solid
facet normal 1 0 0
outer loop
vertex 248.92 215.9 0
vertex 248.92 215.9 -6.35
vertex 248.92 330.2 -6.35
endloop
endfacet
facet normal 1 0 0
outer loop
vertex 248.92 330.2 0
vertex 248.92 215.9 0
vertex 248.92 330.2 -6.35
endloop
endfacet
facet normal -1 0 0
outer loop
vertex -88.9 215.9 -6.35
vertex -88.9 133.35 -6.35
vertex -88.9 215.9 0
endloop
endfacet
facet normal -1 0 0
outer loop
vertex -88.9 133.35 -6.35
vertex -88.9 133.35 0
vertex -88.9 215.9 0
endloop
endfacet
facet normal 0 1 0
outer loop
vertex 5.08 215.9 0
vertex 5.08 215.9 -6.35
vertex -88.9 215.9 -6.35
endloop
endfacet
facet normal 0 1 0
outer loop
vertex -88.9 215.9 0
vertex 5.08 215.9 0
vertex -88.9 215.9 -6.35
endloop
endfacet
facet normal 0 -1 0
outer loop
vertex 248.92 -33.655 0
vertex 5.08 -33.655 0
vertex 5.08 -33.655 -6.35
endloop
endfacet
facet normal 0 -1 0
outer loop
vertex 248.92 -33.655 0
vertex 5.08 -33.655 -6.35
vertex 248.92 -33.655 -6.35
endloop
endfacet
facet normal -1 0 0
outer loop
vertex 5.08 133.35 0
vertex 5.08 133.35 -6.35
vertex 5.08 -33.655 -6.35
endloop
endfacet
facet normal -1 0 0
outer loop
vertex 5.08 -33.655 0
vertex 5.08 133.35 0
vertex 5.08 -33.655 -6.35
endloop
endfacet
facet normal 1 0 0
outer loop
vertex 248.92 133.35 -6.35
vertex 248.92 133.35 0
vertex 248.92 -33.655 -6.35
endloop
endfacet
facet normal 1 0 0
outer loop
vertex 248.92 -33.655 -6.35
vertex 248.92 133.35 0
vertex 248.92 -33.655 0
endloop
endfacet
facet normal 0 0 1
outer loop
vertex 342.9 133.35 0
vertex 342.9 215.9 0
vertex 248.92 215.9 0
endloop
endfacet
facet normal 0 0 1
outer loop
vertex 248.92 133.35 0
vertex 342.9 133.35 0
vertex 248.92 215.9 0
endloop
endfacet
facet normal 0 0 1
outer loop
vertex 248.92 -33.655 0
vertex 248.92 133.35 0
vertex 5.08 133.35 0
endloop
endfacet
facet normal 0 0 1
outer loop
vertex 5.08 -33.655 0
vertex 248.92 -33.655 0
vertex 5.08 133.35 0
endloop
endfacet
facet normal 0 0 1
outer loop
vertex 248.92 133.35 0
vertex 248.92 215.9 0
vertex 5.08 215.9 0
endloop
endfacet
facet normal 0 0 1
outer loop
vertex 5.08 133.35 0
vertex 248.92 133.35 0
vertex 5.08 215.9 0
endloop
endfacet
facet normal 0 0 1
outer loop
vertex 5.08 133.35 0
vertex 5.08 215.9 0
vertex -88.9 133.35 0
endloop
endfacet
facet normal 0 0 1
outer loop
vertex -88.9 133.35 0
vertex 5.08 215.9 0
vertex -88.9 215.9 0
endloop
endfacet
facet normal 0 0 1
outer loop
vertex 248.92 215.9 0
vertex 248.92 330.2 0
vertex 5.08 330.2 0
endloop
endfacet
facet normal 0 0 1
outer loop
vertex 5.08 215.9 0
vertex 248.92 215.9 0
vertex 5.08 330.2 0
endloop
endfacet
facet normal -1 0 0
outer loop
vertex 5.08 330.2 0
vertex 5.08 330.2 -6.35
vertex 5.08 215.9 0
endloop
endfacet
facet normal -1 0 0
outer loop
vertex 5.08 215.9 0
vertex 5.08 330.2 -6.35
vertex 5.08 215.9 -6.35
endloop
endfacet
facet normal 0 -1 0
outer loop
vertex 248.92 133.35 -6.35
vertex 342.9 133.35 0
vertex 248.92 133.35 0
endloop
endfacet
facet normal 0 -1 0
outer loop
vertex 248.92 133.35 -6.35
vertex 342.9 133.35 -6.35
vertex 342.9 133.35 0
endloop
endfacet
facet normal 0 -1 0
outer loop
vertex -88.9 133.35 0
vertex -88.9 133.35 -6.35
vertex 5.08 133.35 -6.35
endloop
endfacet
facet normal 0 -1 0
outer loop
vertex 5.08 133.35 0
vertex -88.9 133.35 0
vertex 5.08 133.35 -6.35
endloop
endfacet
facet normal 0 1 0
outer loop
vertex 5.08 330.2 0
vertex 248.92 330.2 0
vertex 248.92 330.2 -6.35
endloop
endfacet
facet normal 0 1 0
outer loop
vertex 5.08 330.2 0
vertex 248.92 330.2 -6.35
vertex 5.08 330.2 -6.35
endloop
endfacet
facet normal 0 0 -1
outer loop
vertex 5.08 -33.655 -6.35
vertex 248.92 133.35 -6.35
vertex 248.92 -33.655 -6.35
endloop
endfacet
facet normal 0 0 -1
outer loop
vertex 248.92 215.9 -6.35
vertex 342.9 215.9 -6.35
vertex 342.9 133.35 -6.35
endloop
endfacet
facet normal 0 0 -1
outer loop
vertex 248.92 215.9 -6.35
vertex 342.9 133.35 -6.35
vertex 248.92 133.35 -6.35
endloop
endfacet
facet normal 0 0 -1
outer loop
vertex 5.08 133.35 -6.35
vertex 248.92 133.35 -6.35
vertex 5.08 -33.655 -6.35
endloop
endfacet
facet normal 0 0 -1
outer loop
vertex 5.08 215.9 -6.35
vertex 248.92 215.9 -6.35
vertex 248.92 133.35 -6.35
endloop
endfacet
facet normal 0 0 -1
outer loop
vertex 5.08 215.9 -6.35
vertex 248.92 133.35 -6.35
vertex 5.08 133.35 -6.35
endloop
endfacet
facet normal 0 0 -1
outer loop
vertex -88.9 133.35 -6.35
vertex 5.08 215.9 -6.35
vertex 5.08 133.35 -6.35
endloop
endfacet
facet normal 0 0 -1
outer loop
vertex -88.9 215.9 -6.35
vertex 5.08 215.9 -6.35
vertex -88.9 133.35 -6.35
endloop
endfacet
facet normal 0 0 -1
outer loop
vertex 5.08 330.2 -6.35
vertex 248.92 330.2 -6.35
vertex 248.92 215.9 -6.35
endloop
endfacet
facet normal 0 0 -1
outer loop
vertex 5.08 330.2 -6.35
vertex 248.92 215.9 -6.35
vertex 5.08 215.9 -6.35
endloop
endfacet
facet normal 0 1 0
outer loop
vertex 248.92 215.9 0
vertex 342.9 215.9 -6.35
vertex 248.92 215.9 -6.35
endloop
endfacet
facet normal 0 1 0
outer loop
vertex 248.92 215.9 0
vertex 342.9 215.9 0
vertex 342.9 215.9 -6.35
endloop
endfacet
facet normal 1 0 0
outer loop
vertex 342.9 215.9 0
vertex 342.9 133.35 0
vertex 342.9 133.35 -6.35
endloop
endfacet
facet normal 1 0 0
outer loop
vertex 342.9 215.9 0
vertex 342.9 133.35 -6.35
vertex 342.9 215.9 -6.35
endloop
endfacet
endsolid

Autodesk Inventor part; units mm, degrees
ref_plane "YZ Plane" through (0, 0, 0) normal (1, 0, 0) x (0, 1, 0)
ref_plane "Work Plane32" through (254, 330.2, 0) normal (0, 0, -1) x (-1, 0, 0)
sketch "Sketch36" plane through (254, 330.2, 0) normal (0, 0, -1) x (-1, 0, 0)
  line L0 (254, -363.855) -> (254, -196.85) projected
  line L1 (0, 0) -> (0, -114.3) projected
  line L2 (254, -363.855) -> (0, -363.855)
  line L3 (0, -363.855) -> (0, 0)
  line L4 (0, 0) -> (254, 0)
  line L5 (254, 0) -> (254, -363.855)
  line L6 (342.9, -196.85) -> (342.9, -114.3) projected
  line L7 (342.9, -196.85) -> (254, -196.85)
  line L8 (254, -196.85) -> (254, -114.3)
  line L9 (254, -114.3) -> (342.9, -114.3)
  line L10 (342.9, -114.3) -> (342.9, -196.85)
  line L11 (-31.75, -363.855) -> (254, -363.855) projected
  line L12 (0, -314.325) -> (0, -196.85) projected
  line L13 (-31.75, -363.855) -> (0, -363.855)
  line L14 (0, -363.855) -> (0, -314.325)
  line L15 (0, -314.325) -> (-31.75, -314.325)
  line L16 (-31.75, -314.325) -> (-31.75, -363.855)
  line L17 (0, -196.85) -> (-88.9, -196.85)
  line L18 (-88.9, -196.85) -> (-88.9, -114.3)
  line L19 (-88.9, -114.3) -> (0, -114.3)
  line L20 (0, -114.3) -> (0, -196.85)
  dimension "d412" = 82.55
  dimension "d413" = 254
  dimension "d414" = 31.75
extrude "Extrusion20" add sketch "Sketch36" along normal blind 6.35
ref_plane "Work Plane28" through (254, 330.2, -6.35) normal (0, 0, -1) x (-1, 0, 0)
sketch "Sketch39" plane through (254, 330.2, -6.35) normal (0, 0, -1) x (-1, 0, 0)
  line L0 (0, -196.85) -> (0, -314.325) projected
  line L1 (0, -196.85) -> (5.08, -196.85)
  line L2 (5.08, -196.85) -> (5.08, -314.325)
  line L3 (5.08, -314.325) -> (0, -314.325)
  line L4 (0, -314.325) -> (0, -196.85)
  line L5 (254, -363.855) -> (254, -196.85) projected
  line L6 (-31.75, -363.855) -> (254, -363.855) projected
  line L7 (254, -196.85) -> (248.92, -196.85)
  line L8 (248.92, -196.85) -> (248.92, -363.855)
  line L9 (248.92, -363.855) -> (254, -363.855)
  line L10 (254, -363.855) -> (254, -196.85)
  line L11 (0, -114.3) -> (-88.9, -114.3) projected
  line L12 (254, 0) -> (0, 0) projected
  line L13 (0, -114.3) -> (5.08, -114.3)
  line L14 (5.08, -114.3) -> (5.08, 0)
  line L15 (5.08, 0) -> (0, 0)
  line L16 (0, 0) -> (0, -114.3)
  line L17 (254, 0) -> (248.92, 0)
  line L18 (248.92, 0) -> (248.92, -114.3)
  line L19 (248.92, -114.3) -> (254, -114.3)
  line L20 (254, -114.3) -> (254, 0)
  point P0 (254, -330.2)
  dimension "d415" = 5.08
  dimension "d416" = 5.08
  dimension "d417" = 5.08
extrude "Extrusion22" cut sketch "Sketch39" against normal blind 6.35
sketch "Sketch41" plane through (254, 330.2, 0) normal (0, 0, 1) x (1, 0, 0)
  line L0 (-5.08, -314.325) -> (31.75, -314.325) projected
  line L1 (31.75, -363.855) -> (-248.92, -363.855) projected
  line L2 (31.75, -314.325) -> (-5.08, -314.325)
  line L3 (-5.08, -314.325) -> (-5.08, -363.855)
  line L4 (-5.08, -363.855) -> (31.75, -363.855)
  line L5 (31.75, -363.855) -> (31.75, -314.325)
  point P0 (-254, -330.2)
  dimension "d448" = 36.83
extrude "Extrusion24" cut sketch "Sketch41" against normal blind 6.35
properties part number "20Gen2PlatePart"
